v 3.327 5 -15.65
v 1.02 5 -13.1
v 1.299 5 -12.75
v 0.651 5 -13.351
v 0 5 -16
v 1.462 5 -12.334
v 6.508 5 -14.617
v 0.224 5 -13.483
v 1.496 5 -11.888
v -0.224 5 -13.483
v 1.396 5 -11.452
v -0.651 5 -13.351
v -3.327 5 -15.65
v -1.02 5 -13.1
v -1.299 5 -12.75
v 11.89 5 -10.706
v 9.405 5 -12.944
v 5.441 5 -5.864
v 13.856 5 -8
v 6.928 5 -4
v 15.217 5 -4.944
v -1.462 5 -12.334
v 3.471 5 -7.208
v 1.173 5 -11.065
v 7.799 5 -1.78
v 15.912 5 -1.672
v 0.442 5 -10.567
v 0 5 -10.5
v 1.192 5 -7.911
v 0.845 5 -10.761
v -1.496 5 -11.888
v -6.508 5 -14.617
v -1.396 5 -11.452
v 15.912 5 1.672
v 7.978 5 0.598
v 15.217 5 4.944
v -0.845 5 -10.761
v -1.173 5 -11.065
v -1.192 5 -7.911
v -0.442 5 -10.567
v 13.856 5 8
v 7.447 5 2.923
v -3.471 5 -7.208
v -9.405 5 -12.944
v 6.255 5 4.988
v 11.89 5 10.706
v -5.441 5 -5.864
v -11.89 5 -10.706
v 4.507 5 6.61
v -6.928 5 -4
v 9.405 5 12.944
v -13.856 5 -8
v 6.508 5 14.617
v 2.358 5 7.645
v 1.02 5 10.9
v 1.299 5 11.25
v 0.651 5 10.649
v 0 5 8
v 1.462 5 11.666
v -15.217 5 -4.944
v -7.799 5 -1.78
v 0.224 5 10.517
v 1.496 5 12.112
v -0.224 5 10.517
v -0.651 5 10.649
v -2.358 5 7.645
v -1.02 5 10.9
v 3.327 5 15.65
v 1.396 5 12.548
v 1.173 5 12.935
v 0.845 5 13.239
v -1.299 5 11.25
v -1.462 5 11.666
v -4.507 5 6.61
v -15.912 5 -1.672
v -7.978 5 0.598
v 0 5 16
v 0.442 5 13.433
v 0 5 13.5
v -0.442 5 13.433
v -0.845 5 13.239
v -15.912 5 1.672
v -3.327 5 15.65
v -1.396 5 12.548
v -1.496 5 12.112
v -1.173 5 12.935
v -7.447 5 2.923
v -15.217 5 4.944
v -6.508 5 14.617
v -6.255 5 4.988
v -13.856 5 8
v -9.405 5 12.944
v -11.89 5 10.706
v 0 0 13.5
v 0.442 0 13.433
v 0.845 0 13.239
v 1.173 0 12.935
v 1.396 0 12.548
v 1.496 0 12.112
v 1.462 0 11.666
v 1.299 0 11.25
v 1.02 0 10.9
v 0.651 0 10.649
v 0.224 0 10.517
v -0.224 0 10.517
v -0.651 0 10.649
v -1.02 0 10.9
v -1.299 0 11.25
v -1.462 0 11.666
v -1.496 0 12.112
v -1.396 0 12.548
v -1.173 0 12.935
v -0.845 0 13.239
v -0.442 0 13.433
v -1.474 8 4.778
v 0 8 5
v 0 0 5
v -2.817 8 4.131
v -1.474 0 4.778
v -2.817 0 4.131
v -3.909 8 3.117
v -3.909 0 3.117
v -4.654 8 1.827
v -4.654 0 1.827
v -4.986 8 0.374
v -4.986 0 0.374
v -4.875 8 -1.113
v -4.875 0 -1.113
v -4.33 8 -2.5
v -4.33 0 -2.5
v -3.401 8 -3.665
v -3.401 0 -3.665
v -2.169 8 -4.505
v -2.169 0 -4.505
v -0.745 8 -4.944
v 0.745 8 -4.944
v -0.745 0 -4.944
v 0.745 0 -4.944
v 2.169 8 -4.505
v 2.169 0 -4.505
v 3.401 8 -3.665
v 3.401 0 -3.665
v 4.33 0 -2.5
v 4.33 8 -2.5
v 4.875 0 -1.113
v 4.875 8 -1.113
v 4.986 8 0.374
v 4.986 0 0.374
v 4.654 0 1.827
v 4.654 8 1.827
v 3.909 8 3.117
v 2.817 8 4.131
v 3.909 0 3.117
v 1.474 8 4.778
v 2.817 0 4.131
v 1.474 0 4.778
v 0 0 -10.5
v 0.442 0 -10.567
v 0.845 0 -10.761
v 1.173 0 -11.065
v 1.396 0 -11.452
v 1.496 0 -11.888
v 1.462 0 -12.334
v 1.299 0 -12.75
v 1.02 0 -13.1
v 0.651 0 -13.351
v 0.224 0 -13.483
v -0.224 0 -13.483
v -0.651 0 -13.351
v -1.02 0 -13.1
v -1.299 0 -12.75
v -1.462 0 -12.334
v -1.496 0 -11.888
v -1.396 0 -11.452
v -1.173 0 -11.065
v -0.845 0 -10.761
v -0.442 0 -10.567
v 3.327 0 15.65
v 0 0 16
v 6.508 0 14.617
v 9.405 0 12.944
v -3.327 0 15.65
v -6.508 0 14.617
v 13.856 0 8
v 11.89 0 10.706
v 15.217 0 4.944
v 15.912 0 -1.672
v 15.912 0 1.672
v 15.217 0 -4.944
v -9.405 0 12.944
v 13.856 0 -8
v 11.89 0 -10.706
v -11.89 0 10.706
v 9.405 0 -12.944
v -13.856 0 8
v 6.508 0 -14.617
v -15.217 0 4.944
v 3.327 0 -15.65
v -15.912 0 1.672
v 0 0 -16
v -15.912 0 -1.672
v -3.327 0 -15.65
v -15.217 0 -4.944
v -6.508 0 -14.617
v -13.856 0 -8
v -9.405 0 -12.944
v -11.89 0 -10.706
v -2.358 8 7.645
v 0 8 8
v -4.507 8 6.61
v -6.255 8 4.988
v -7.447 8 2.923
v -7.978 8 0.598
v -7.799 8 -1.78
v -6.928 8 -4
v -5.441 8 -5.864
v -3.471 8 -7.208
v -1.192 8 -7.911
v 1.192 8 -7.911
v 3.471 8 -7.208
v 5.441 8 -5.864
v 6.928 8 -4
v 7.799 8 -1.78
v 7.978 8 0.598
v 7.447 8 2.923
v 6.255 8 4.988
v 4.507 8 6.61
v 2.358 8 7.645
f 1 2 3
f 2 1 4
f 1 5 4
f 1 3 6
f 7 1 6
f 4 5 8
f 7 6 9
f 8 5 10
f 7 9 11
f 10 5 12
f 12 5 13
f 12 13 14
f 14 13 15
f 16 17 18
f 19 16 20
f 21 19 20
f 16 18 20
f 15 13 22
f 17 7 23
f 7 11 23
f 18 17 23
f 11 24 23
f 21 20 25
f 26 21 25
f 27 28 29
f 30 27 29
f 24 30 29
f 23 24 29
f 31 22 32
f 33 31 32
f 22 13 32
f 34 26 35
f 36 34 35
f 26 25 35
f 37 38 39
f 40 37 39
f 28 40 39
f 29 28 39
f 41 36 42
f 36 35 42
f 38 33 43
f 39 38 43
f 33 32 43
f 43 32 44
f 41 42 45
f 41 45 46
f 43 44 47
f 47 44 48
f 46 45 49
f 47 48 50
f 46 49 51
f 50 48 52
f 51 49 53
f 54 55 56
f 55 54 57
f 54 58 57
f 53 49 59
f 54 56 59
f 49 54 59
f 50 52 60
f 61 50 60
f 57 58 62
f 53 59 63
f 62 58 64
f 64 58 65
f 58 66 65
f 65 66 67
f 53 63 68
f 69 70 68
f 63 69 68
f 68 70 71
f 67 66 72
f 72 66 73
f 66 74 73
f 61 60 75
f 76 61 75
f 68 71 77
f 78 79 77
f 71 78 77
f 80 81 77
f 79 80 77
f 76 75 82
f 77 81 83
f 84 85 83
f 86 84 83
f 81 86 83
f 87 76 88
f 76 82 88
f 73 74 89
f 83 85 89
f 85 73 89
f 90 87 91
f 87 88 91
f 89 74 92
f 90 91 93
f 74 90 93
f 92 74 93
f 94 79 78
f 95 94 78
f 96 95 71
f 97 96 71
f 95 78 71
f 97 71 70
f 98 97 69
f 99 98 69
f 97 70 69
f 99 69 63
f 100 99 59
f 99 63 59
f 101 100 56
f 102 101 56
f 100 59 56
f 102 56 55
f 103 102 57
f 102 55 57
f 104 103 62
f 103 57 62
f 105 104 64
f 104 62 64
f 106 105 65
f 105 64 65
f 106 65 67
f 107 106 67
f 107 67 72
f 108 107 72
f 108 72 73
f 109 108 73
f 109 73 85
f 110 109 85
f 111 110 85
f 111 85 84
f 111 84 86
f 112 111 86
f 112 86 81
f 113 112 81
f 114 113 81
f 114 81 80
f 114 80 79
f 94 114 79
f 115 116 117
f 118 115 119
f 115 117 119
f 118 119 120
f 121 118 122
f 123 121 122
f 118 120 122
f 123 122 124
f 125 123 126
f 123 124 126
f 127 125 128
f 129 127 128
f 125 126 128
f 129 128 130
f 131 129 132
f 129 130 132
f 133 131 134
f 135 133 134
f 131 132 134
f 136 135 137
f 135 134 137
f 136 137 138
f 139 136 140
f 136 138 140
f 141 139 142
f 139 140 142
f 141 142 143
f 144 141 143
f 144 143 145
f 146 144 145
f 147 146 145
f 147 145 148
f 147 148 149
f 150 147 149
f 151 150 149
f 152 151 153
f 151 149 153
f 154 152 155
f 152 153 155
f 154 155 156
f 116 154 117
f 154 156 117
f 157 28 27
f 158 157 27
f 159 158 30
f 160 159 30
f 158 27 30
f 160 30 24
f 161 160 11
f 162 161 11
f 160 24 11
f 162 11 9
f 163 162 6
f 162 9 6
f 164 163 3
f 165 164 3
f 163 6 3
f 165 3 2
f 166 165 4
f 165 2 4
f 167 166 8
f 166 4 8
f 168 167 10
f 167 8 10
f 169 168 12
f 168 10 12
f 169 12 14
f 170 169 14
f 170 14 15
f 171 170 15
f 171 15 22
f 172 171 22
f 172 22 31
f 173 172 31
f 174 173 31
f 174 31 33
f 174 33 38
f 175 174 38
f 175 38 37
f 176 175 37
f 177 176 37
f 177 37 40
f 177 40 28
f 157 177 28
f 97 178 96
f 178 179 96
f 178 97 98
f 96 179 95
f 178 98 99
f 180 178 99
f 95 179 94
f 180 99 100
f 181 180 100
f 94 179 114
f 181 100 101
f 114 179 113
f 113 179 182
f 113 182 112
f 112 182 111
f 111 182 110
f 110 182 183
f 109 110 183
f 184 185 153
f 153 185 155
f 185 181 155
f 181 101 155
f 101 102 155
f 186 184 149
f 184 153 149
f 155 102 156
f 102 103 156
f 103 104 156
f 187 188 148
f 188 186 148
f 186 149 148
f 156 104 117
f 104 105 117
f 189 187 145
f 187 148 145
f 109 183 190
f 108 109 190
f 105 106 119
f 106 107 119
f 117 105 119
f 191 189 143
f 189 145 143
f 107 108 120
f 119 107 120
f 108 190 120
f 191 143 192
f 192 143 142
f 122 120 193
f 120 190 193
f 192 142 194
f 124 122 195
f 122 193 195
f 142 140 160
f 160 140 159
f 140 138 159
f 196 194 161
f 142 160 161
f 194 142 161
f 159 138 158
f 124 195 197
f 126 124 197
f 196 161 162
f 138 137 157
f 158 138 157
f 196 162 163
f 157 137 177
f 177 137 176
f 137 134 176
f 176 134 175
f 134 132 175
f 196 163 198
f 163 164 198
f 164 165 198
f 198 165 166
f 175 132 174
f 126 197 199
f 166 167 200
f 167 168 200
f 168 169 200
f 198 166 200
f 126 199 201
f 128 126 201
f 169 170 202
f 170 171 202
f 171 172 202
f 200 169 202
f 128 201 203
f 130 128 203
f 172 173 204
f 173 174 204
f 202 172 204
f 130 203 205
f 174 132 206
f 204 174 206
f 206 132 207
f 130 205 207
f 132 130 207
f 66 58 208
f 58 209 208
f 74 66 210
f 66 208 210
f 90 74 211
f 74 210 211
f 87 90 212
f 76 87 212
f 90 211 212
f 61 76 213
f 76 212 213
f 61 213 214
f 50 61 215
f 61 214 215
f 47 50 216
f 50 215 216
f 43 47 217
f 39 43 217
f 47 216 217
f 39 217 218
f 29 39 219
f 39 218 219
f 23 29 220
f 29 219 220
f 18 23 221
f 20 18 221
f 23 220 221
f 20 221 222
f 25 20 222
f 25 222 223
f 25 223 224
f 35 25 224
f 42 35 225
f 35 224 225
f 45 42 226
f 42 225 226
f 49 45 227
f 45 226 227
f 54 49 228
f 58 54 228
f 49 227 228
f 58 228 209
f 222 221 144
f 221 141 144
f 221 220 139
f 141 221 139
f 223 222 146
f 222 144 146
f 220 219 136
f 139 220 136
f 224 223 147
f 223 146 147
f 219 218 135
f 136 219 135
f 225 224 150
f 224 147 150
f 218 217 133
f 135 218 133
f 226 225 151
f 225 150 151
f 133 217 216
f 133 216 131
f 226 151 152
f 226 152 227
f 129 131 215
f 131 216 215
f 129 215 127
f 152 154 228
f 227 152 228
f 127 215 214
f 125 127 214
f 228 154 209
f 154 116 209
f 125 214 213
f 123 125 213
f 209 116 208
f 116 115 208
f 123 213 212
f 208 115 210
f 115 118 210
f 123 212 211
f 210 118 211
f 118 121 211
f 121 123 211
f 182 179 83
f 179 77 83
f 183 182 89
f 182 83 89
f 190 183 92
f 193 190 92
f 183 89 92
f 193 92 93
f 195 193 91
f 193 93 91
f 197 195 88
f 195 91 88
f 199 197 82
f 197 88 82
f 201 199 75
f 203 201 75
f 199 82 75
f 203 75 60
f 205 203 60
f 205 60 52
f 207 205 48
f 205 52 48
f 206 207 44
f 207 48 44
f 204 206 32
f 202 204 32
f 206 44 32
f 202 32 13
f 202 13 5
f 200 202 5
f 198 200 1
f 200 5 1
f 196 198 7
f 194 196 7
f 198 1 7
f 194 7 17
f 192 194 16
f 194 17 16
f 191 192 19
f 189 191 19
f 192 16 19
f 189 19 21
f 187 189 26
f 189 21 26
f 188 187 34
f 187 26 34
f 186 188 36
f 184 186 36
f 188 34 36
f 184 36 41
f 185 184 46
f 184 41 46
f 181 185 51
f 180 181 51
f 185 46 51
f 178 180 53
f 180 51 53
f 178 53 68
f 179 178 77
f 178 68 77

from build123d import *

# Parameters (mm, degrees)
SKETCH_3_R          = 1.5
CUT_EXTRUDE_4_DEPTH = 24.173260453
SKETCH_3_4_R        = 1.5
CUT_EXTRUDE_5_DEPTH = 24.173260453


with BuildPart() as part:
    # Эскиз2 → Повернуть1 (revolve)
    with BuildSketch(Plane(origin=(0, 0, 0), x_dir=(0, 0, -1), z_dir=(1, 0, 0))):
        Polygon((5, 0), (16, 0), (16, 5), (8, 5), (8, 8), (5, 8), align=None)
    revolve(axis=Axis((0, 18.095647444, 0), (0, -1, 0)))

    # Эскиз3 → Вырез-Вытянуть4 (cut, through all)
    with BuildSketch(Plane(origin=(0, 5, 0), x_dir=(1, 0, 0), z_dir=(0, 1, 0))):
        with Locations((0, 12)):
            Circle(SKETCH_3_R)
    extrude(amount=-CUT_EXTRUDE_4_DEPTH, mode=Mode.SUBTRACT)

    # Эскиз3<4> → Вырез-Вытянуть5 (cut, through all)
    with BuildSketch(Plane(origin=(0, 5, 0), x_dir=(1, 0, 0), z_dir=(0, 1, 0))):
        with Locations((0, -12)):
            Circle(SKETCH_3_4_R)
    extrude(amount=-CUT_EXTRUDE_5_DEPTH, mode=Mode.SUBTRACT)


solid = part.part
